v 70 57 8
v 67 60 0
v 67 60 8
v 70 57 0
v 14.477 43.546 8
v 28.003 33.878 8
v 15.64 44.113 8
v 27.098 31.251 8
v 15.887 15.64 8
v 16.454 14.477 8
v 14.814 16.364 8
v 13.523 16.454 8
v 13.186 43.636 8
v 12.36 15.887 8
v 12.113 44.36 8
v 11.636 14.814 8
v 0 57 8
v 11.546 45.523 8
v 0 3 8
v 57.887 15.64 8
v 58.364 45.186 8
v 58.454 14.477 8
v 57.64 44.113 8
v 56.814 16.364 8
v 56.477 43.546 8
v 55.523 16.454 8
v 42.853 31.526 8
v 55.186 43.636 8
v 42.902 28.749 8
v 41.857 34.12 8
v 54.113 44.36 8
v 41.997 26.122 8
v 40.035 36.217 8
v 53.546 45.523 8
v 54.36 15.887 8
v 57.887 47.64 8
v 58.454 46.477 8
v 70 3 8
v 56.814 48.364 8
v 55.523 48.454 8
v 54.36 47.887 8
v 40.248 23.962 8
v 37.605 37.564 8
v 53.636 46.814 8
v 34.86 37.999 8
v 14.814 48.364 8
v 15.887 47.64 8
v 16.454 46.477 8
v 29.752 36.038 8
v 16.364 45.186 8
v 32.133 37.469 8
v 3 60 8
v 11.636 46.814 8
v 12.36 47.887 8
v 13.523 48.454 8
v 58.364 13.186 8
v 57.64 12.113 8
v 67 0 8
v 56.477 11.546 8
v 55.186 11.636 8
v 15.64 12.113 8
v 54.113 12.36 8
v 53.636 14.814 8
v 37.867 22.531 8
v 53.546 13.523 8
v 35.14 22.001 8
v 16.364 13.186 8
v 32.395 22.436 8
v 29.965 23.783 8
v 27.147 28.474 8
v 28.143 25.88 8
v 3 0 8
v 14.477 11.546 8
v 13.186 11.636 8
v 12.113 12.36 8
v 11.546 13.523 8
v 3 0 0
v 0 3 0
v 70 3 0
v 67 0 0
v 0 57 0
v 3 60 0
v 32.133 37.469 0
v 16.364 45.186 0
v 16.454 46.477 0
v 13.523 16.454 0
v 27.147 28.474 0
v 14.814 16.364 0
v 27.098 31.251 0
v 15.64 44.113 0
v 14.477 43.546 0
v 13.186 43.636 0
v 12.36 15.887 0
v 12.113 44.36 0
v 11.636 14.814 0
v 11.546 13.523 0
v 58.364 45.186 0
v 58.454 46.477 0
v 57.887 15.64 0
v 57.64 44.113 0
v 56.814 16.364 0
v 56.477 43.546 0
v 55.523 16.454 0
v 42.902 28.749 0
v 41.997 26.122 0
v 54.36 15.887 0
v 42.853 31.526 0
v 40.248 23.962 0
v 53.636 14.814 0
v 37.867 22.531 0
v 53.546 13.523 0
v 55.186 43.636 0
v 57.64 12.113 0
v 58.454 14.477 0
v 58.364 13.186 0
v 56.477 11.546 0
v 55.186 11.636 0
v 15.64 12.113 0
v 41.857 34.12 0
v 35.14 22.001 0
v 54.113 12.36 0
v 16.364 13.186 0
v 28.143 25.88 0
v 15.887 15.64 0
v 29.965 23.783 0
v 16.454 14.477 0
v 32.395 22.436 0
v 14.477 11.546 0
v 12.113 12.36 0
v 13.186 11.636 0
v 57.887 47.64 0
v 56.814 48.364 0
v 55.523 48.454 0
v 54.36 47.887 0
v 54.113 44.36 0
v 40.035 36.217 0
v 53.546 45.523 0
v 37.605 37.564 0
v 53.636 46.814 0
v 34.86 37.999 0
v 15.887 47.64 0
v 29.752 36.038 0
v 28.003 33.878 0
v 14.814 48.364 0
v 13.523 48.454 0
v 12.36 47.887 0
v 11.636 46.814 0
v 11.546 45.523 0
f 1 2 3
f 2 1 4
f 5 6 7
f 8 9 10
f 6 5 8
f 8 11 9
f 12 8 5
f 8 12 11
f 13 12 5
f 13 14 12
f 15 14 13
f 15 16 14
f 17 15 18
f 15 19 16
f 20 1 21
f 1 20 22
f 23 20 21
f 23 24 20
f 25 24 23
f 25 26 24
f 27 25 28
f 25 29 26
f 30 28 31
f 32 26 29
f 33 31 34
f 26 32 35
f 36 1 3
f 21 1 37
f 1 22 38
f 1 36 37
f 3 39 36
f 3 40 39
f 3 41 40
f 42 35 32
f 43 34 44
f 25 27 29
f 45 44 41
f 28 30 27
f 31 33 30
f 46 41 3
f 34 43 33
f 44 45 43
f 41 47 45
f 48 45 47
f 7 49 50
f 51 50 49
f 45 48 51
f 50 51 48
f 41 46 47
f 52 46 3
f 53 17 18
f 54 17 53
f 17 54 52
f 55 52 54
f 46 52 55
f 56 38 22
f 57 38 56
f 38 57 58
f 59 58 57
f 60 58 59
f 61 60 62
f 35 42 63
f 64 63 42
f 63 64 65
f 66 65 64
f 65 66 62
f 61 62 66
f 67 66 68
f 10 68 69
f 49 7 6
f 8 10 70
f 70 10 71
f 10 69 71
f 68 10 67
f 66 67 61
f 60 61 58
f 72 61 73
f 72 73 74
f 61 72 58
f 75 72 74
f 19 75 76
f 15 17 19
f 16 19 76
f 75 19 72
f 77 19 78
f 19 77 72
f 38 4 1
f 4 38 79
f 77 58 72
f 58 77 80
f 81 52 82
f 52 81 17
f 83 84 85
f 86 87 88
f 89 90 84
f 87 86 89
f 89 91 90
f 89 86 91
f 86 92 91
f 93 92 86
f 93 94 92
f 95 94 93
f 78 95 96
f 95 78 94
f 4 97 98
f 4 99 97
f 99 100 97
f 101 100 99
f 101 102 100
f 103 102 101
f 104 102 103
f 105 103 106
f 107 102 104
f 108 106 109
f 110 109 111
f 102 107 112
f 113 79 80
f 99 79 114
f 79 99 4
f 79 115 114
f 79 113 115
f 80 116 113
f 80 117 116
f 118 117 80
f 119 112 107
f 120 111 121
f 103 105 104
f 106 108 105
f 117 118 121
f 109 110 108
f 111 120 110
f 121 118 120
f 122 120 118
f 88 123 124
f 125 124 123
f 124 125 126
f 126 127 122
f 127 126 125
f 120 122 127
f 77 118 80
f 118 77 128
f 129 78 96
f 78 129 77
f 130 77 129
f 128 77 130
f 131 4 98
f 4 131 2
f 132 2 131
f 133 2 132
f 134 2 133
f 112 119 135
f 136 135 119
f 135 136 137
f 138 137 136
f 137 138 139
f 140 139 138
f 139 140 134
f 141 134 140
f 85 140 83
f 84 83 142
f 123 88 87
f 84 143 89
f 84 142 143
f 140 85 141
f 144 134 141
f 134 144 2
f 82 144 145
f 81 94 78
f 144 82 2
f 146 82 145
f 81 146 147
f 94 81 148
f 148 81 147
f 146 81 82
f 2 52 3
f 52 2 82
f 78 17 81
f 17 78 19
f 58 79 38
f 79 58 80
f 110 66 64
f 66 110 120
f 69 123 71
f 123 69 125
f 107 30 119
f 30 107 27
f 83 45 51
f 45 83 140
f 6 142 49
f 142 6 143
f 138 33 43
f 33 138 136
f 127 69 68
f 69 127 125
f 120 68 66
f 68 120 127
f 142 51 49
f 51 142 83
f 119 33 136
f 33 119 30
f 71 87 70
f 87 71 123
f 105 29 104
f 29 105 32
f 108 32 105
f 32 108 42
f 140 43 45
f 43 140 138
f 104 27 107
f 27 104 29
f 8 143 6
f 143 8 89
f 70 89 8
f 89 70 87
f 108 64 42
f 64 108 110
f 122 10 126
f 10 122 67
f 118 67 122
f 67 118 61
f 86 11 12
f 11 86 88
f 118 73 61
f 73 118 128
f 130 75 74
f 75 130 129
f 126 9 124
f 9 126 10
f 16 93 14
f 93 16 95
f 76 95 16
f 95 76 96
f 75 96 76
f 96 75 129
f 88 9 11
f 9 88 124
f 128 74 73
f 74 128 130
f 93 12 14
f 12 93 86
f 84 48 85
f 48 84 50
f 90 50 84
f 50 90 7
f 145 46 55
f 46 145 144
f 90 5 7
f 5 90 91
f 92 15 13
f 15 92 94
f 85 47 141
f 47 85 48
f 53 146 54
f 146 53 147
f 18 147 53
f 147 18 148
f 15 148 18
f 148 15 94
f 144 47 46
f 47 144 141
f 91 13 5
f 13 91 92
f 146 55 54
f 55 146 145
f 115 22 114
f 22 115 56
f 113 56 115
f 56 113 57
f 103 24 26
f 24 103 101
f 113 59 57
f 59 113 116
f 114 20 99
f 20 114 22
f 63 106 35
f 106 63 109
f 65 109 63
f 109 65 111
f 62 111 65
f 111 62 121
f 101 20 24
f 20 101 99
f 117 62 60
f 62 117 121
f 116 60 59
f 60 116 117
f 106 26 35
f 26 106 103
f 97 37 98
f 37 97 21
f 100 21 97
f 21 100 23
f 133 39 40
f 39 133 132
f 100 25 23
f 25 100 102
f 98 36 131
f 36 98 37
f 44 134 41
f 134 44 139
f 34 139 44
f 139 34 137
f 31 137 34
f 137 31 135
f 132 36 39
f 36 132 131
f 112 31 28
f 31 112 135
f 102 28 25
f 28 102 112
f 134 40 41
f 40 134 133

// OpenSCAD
$fn = 32;

// ----------------------------------------------------------------------
// Spacer plate: rect 70 x 60
// ----------------------------------------------------------------------

// --- parameters (mm) ---
bore_r = 8;               // centre bore radius
bolt_r = 2.5;             // bolt hole radius
plate_t = 8;              // plate thickness, Z (extrusion height)
plate_l = 70;             // plate length, X
plate_w = 60;             // plate width, Y
inset = 14;               // corner hole inset

profile = [[3, 0], [67, 0], [70, 3], [70, 57], [67, 60], [3, 60], [0, 57], [0, 3]];  // primary outline, 8 points, counter clockwise
void_1 = [[42.853, 31.526], [41.857, 34.12], [40.035, 36.217], [37.605, 37.564], [34.86, 37.999], [32.133, 37.469], [29.752, 36.038], [28.003, 33.878], [27.098, 31.251], [27.147, 28.474], [28.143, 25.88], [29.965, 23.783], [32.395, 22.436], [35.14, 22.001], [37.867, 22.531], [40.248, 23.962], [41.997, 26.122], [42.902, 28.749]];  // centre bore, 18 points
void_2 = [[16.454, 14.477], [15.887, 15.64], [14.814, 16.364], [13.523, 16.454], [12.36, 15.887], [11.636, 14.814], [11.546, 13.523], [12.113, 12.36], [13.186, 11.636], [14.477, 11.546], [15.64, 12.113], [16.364, 13.186]];  // corner hole, 12 points
void_3 = [[16.454, 46.477], [15.887, 47.64], [14.814, 48.364], [13.523, 48.454], [12.36, 47.887], [11.636, 46.814], [11.546, 45.523], [12.113, 44.36], [13.186, 43.636], [14.477, 43.546], [15.64, 44.113], [16.364, 45.186]];  // corner hole, 12 points
void_4 = [[58.454, 14.477], [57.887, 15.64], [56.814, 16.364], [55.523, 16.454], [54.36, 15.887], [53.636, 14.814], [53.546, 13.523], [54.113, 12.36], [55.186, 11.636], [56.477, 11.546], [57.64, 12.113], [58.364, 13.186]];  // corner hole, 12 points
void_5 = [[58.454, 46.477], [57.887, 47.64], [56.814, 48.364], [55.523, 48.454], [54.36, 47.887], [53.636, 46.814], [53.546, 45.523], [54.113, 44.36], [55.186, 43.636], [56.477, 43.546], [57.64, 44.113], [58.364, 45.186]];  // corner hole, 12 points

// --- the one profile operation ---
difference() {
  linear_extrude(height = plate_t) polygon(points = profile);
  translate([0, 0, -1])
    linear_extrude(height = plate_t + 2) polygon(points = void_1);
  translate([0, 0, -1])
    linear_extrude(height = plate_t + 2) polygon(points = void_2);
  translate([0, 0, -1])
    linear_extrude(height = plate_t + 2) polygon(points = void_3);
  translate([0, 0, -1])
    linear_extrude(height = plate_t + 2) polygon(points = void_4);
  translate([0, 0, -1])
    linear_extrude(height = plate_t + 2) polygon(points = void_5);
}
